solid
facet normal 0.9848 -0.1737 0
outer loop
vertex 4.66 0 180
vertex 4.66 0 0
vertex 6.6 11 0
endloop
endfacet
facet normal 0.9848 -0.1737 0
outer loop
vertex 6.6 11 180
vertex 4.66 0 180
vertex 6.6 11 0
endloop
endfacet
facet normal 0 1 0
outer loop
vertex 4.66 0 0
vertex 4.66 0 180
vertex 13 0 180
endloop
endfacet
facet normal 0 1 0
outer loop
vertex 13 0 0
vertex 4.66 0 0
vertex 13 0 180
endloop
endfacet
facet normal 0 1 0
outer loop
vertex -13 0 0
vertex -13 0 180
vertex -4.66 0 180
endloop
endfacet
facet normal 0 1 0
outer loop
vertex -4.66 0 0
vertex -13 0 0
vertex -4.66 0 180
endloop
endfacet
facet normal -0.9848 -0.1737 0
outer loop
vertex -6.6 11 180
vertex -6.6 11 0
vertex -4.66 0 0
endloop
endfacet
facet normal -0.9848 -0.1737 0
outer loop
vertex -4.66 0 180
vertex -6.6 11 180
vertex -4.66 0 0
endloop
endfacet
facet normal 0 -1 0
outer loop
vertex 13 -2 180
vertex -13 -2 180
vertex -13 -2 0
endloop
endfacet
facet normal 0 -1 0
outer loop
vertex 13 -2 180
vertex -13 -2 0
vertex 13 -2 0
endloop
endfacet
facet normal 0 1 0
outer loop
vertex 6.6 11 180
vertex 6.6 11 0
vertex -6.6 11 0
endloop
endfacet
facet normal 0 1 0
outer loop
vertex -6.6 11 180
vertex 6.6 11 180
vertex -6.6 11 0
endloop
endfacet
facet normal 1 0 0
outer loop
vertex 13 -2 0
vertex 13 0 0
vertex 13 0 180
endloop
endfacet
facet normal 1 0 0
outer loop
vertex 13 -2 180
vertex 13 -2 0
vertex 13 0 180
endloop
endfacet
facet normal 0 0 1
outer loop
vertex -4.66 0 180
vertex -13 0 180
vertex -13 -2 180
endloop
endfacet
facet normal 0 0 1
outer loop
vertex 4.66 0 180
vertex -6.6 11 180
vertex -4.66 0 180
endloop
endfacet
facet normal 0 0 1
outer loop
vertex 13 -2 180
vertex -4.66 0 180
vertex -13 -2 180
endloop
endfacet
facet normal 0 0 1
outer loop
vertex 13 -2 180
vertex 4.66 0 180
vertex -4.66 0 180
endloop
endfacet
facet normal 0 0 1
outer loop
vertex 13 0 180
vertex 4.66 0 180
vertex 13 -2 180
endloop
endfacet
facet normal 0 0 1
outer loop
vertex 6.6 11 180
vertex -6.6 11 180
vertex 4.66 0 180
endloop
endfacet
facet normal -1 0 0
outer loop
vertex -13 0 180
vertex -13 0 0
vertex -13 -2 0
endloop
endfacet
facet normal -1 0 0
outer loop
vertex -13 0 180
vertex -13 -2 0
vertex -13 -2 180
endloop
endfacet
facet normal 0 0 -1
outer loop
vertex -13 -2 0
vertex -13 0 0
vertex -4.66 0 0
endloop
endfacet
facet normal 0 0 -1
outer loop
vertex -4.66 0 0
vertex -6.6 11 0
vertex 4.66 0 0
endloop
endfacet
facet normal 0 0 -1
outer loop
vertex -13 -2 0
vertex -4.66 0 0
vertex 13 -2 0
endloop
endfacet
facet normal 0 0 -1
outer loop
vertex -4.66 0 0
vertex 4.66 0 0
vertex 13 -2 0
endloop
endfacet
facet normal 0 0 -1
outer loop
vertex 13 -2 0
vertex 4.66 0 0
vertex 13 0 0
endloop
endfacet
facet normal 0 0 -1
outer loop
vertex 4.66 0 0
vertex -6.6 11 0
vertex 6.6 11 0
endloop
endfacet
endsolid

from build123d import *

# Parameters (mm, degrees)
BOSS_EXTRUDE1_DEPTH = 180
SKETCH2_W           = 26
SKETCH2_H           = 180
BOSS_EXTRUDE2_DEPTH = 2


with BuildPart() as part:
    # Sketch1 → Boss-Extrude1 (new body)
    with BuildSketch(Plane.XY):
        Polygon((-6.6, 11), (-4.660403212, 0), (0, 0), (0, 11), align=None)
        Polygon((0, 11), (0, 0), (4.660403212, 0), (6.6, 11), align=None)
    extrude(amount=BOSS_EXTRUDE1_DEPTH)

    # Sketch2 → Boss-Extrude2 (add)
    with BuildSketch(Plane.XZ):
        with Locations((0, 90)):
            Rectangle(SKETCH2_W, SKETCH2_H)
    extrude(amount=BOSS_EXTRUDE2_DEPTH)


solid = part.part
